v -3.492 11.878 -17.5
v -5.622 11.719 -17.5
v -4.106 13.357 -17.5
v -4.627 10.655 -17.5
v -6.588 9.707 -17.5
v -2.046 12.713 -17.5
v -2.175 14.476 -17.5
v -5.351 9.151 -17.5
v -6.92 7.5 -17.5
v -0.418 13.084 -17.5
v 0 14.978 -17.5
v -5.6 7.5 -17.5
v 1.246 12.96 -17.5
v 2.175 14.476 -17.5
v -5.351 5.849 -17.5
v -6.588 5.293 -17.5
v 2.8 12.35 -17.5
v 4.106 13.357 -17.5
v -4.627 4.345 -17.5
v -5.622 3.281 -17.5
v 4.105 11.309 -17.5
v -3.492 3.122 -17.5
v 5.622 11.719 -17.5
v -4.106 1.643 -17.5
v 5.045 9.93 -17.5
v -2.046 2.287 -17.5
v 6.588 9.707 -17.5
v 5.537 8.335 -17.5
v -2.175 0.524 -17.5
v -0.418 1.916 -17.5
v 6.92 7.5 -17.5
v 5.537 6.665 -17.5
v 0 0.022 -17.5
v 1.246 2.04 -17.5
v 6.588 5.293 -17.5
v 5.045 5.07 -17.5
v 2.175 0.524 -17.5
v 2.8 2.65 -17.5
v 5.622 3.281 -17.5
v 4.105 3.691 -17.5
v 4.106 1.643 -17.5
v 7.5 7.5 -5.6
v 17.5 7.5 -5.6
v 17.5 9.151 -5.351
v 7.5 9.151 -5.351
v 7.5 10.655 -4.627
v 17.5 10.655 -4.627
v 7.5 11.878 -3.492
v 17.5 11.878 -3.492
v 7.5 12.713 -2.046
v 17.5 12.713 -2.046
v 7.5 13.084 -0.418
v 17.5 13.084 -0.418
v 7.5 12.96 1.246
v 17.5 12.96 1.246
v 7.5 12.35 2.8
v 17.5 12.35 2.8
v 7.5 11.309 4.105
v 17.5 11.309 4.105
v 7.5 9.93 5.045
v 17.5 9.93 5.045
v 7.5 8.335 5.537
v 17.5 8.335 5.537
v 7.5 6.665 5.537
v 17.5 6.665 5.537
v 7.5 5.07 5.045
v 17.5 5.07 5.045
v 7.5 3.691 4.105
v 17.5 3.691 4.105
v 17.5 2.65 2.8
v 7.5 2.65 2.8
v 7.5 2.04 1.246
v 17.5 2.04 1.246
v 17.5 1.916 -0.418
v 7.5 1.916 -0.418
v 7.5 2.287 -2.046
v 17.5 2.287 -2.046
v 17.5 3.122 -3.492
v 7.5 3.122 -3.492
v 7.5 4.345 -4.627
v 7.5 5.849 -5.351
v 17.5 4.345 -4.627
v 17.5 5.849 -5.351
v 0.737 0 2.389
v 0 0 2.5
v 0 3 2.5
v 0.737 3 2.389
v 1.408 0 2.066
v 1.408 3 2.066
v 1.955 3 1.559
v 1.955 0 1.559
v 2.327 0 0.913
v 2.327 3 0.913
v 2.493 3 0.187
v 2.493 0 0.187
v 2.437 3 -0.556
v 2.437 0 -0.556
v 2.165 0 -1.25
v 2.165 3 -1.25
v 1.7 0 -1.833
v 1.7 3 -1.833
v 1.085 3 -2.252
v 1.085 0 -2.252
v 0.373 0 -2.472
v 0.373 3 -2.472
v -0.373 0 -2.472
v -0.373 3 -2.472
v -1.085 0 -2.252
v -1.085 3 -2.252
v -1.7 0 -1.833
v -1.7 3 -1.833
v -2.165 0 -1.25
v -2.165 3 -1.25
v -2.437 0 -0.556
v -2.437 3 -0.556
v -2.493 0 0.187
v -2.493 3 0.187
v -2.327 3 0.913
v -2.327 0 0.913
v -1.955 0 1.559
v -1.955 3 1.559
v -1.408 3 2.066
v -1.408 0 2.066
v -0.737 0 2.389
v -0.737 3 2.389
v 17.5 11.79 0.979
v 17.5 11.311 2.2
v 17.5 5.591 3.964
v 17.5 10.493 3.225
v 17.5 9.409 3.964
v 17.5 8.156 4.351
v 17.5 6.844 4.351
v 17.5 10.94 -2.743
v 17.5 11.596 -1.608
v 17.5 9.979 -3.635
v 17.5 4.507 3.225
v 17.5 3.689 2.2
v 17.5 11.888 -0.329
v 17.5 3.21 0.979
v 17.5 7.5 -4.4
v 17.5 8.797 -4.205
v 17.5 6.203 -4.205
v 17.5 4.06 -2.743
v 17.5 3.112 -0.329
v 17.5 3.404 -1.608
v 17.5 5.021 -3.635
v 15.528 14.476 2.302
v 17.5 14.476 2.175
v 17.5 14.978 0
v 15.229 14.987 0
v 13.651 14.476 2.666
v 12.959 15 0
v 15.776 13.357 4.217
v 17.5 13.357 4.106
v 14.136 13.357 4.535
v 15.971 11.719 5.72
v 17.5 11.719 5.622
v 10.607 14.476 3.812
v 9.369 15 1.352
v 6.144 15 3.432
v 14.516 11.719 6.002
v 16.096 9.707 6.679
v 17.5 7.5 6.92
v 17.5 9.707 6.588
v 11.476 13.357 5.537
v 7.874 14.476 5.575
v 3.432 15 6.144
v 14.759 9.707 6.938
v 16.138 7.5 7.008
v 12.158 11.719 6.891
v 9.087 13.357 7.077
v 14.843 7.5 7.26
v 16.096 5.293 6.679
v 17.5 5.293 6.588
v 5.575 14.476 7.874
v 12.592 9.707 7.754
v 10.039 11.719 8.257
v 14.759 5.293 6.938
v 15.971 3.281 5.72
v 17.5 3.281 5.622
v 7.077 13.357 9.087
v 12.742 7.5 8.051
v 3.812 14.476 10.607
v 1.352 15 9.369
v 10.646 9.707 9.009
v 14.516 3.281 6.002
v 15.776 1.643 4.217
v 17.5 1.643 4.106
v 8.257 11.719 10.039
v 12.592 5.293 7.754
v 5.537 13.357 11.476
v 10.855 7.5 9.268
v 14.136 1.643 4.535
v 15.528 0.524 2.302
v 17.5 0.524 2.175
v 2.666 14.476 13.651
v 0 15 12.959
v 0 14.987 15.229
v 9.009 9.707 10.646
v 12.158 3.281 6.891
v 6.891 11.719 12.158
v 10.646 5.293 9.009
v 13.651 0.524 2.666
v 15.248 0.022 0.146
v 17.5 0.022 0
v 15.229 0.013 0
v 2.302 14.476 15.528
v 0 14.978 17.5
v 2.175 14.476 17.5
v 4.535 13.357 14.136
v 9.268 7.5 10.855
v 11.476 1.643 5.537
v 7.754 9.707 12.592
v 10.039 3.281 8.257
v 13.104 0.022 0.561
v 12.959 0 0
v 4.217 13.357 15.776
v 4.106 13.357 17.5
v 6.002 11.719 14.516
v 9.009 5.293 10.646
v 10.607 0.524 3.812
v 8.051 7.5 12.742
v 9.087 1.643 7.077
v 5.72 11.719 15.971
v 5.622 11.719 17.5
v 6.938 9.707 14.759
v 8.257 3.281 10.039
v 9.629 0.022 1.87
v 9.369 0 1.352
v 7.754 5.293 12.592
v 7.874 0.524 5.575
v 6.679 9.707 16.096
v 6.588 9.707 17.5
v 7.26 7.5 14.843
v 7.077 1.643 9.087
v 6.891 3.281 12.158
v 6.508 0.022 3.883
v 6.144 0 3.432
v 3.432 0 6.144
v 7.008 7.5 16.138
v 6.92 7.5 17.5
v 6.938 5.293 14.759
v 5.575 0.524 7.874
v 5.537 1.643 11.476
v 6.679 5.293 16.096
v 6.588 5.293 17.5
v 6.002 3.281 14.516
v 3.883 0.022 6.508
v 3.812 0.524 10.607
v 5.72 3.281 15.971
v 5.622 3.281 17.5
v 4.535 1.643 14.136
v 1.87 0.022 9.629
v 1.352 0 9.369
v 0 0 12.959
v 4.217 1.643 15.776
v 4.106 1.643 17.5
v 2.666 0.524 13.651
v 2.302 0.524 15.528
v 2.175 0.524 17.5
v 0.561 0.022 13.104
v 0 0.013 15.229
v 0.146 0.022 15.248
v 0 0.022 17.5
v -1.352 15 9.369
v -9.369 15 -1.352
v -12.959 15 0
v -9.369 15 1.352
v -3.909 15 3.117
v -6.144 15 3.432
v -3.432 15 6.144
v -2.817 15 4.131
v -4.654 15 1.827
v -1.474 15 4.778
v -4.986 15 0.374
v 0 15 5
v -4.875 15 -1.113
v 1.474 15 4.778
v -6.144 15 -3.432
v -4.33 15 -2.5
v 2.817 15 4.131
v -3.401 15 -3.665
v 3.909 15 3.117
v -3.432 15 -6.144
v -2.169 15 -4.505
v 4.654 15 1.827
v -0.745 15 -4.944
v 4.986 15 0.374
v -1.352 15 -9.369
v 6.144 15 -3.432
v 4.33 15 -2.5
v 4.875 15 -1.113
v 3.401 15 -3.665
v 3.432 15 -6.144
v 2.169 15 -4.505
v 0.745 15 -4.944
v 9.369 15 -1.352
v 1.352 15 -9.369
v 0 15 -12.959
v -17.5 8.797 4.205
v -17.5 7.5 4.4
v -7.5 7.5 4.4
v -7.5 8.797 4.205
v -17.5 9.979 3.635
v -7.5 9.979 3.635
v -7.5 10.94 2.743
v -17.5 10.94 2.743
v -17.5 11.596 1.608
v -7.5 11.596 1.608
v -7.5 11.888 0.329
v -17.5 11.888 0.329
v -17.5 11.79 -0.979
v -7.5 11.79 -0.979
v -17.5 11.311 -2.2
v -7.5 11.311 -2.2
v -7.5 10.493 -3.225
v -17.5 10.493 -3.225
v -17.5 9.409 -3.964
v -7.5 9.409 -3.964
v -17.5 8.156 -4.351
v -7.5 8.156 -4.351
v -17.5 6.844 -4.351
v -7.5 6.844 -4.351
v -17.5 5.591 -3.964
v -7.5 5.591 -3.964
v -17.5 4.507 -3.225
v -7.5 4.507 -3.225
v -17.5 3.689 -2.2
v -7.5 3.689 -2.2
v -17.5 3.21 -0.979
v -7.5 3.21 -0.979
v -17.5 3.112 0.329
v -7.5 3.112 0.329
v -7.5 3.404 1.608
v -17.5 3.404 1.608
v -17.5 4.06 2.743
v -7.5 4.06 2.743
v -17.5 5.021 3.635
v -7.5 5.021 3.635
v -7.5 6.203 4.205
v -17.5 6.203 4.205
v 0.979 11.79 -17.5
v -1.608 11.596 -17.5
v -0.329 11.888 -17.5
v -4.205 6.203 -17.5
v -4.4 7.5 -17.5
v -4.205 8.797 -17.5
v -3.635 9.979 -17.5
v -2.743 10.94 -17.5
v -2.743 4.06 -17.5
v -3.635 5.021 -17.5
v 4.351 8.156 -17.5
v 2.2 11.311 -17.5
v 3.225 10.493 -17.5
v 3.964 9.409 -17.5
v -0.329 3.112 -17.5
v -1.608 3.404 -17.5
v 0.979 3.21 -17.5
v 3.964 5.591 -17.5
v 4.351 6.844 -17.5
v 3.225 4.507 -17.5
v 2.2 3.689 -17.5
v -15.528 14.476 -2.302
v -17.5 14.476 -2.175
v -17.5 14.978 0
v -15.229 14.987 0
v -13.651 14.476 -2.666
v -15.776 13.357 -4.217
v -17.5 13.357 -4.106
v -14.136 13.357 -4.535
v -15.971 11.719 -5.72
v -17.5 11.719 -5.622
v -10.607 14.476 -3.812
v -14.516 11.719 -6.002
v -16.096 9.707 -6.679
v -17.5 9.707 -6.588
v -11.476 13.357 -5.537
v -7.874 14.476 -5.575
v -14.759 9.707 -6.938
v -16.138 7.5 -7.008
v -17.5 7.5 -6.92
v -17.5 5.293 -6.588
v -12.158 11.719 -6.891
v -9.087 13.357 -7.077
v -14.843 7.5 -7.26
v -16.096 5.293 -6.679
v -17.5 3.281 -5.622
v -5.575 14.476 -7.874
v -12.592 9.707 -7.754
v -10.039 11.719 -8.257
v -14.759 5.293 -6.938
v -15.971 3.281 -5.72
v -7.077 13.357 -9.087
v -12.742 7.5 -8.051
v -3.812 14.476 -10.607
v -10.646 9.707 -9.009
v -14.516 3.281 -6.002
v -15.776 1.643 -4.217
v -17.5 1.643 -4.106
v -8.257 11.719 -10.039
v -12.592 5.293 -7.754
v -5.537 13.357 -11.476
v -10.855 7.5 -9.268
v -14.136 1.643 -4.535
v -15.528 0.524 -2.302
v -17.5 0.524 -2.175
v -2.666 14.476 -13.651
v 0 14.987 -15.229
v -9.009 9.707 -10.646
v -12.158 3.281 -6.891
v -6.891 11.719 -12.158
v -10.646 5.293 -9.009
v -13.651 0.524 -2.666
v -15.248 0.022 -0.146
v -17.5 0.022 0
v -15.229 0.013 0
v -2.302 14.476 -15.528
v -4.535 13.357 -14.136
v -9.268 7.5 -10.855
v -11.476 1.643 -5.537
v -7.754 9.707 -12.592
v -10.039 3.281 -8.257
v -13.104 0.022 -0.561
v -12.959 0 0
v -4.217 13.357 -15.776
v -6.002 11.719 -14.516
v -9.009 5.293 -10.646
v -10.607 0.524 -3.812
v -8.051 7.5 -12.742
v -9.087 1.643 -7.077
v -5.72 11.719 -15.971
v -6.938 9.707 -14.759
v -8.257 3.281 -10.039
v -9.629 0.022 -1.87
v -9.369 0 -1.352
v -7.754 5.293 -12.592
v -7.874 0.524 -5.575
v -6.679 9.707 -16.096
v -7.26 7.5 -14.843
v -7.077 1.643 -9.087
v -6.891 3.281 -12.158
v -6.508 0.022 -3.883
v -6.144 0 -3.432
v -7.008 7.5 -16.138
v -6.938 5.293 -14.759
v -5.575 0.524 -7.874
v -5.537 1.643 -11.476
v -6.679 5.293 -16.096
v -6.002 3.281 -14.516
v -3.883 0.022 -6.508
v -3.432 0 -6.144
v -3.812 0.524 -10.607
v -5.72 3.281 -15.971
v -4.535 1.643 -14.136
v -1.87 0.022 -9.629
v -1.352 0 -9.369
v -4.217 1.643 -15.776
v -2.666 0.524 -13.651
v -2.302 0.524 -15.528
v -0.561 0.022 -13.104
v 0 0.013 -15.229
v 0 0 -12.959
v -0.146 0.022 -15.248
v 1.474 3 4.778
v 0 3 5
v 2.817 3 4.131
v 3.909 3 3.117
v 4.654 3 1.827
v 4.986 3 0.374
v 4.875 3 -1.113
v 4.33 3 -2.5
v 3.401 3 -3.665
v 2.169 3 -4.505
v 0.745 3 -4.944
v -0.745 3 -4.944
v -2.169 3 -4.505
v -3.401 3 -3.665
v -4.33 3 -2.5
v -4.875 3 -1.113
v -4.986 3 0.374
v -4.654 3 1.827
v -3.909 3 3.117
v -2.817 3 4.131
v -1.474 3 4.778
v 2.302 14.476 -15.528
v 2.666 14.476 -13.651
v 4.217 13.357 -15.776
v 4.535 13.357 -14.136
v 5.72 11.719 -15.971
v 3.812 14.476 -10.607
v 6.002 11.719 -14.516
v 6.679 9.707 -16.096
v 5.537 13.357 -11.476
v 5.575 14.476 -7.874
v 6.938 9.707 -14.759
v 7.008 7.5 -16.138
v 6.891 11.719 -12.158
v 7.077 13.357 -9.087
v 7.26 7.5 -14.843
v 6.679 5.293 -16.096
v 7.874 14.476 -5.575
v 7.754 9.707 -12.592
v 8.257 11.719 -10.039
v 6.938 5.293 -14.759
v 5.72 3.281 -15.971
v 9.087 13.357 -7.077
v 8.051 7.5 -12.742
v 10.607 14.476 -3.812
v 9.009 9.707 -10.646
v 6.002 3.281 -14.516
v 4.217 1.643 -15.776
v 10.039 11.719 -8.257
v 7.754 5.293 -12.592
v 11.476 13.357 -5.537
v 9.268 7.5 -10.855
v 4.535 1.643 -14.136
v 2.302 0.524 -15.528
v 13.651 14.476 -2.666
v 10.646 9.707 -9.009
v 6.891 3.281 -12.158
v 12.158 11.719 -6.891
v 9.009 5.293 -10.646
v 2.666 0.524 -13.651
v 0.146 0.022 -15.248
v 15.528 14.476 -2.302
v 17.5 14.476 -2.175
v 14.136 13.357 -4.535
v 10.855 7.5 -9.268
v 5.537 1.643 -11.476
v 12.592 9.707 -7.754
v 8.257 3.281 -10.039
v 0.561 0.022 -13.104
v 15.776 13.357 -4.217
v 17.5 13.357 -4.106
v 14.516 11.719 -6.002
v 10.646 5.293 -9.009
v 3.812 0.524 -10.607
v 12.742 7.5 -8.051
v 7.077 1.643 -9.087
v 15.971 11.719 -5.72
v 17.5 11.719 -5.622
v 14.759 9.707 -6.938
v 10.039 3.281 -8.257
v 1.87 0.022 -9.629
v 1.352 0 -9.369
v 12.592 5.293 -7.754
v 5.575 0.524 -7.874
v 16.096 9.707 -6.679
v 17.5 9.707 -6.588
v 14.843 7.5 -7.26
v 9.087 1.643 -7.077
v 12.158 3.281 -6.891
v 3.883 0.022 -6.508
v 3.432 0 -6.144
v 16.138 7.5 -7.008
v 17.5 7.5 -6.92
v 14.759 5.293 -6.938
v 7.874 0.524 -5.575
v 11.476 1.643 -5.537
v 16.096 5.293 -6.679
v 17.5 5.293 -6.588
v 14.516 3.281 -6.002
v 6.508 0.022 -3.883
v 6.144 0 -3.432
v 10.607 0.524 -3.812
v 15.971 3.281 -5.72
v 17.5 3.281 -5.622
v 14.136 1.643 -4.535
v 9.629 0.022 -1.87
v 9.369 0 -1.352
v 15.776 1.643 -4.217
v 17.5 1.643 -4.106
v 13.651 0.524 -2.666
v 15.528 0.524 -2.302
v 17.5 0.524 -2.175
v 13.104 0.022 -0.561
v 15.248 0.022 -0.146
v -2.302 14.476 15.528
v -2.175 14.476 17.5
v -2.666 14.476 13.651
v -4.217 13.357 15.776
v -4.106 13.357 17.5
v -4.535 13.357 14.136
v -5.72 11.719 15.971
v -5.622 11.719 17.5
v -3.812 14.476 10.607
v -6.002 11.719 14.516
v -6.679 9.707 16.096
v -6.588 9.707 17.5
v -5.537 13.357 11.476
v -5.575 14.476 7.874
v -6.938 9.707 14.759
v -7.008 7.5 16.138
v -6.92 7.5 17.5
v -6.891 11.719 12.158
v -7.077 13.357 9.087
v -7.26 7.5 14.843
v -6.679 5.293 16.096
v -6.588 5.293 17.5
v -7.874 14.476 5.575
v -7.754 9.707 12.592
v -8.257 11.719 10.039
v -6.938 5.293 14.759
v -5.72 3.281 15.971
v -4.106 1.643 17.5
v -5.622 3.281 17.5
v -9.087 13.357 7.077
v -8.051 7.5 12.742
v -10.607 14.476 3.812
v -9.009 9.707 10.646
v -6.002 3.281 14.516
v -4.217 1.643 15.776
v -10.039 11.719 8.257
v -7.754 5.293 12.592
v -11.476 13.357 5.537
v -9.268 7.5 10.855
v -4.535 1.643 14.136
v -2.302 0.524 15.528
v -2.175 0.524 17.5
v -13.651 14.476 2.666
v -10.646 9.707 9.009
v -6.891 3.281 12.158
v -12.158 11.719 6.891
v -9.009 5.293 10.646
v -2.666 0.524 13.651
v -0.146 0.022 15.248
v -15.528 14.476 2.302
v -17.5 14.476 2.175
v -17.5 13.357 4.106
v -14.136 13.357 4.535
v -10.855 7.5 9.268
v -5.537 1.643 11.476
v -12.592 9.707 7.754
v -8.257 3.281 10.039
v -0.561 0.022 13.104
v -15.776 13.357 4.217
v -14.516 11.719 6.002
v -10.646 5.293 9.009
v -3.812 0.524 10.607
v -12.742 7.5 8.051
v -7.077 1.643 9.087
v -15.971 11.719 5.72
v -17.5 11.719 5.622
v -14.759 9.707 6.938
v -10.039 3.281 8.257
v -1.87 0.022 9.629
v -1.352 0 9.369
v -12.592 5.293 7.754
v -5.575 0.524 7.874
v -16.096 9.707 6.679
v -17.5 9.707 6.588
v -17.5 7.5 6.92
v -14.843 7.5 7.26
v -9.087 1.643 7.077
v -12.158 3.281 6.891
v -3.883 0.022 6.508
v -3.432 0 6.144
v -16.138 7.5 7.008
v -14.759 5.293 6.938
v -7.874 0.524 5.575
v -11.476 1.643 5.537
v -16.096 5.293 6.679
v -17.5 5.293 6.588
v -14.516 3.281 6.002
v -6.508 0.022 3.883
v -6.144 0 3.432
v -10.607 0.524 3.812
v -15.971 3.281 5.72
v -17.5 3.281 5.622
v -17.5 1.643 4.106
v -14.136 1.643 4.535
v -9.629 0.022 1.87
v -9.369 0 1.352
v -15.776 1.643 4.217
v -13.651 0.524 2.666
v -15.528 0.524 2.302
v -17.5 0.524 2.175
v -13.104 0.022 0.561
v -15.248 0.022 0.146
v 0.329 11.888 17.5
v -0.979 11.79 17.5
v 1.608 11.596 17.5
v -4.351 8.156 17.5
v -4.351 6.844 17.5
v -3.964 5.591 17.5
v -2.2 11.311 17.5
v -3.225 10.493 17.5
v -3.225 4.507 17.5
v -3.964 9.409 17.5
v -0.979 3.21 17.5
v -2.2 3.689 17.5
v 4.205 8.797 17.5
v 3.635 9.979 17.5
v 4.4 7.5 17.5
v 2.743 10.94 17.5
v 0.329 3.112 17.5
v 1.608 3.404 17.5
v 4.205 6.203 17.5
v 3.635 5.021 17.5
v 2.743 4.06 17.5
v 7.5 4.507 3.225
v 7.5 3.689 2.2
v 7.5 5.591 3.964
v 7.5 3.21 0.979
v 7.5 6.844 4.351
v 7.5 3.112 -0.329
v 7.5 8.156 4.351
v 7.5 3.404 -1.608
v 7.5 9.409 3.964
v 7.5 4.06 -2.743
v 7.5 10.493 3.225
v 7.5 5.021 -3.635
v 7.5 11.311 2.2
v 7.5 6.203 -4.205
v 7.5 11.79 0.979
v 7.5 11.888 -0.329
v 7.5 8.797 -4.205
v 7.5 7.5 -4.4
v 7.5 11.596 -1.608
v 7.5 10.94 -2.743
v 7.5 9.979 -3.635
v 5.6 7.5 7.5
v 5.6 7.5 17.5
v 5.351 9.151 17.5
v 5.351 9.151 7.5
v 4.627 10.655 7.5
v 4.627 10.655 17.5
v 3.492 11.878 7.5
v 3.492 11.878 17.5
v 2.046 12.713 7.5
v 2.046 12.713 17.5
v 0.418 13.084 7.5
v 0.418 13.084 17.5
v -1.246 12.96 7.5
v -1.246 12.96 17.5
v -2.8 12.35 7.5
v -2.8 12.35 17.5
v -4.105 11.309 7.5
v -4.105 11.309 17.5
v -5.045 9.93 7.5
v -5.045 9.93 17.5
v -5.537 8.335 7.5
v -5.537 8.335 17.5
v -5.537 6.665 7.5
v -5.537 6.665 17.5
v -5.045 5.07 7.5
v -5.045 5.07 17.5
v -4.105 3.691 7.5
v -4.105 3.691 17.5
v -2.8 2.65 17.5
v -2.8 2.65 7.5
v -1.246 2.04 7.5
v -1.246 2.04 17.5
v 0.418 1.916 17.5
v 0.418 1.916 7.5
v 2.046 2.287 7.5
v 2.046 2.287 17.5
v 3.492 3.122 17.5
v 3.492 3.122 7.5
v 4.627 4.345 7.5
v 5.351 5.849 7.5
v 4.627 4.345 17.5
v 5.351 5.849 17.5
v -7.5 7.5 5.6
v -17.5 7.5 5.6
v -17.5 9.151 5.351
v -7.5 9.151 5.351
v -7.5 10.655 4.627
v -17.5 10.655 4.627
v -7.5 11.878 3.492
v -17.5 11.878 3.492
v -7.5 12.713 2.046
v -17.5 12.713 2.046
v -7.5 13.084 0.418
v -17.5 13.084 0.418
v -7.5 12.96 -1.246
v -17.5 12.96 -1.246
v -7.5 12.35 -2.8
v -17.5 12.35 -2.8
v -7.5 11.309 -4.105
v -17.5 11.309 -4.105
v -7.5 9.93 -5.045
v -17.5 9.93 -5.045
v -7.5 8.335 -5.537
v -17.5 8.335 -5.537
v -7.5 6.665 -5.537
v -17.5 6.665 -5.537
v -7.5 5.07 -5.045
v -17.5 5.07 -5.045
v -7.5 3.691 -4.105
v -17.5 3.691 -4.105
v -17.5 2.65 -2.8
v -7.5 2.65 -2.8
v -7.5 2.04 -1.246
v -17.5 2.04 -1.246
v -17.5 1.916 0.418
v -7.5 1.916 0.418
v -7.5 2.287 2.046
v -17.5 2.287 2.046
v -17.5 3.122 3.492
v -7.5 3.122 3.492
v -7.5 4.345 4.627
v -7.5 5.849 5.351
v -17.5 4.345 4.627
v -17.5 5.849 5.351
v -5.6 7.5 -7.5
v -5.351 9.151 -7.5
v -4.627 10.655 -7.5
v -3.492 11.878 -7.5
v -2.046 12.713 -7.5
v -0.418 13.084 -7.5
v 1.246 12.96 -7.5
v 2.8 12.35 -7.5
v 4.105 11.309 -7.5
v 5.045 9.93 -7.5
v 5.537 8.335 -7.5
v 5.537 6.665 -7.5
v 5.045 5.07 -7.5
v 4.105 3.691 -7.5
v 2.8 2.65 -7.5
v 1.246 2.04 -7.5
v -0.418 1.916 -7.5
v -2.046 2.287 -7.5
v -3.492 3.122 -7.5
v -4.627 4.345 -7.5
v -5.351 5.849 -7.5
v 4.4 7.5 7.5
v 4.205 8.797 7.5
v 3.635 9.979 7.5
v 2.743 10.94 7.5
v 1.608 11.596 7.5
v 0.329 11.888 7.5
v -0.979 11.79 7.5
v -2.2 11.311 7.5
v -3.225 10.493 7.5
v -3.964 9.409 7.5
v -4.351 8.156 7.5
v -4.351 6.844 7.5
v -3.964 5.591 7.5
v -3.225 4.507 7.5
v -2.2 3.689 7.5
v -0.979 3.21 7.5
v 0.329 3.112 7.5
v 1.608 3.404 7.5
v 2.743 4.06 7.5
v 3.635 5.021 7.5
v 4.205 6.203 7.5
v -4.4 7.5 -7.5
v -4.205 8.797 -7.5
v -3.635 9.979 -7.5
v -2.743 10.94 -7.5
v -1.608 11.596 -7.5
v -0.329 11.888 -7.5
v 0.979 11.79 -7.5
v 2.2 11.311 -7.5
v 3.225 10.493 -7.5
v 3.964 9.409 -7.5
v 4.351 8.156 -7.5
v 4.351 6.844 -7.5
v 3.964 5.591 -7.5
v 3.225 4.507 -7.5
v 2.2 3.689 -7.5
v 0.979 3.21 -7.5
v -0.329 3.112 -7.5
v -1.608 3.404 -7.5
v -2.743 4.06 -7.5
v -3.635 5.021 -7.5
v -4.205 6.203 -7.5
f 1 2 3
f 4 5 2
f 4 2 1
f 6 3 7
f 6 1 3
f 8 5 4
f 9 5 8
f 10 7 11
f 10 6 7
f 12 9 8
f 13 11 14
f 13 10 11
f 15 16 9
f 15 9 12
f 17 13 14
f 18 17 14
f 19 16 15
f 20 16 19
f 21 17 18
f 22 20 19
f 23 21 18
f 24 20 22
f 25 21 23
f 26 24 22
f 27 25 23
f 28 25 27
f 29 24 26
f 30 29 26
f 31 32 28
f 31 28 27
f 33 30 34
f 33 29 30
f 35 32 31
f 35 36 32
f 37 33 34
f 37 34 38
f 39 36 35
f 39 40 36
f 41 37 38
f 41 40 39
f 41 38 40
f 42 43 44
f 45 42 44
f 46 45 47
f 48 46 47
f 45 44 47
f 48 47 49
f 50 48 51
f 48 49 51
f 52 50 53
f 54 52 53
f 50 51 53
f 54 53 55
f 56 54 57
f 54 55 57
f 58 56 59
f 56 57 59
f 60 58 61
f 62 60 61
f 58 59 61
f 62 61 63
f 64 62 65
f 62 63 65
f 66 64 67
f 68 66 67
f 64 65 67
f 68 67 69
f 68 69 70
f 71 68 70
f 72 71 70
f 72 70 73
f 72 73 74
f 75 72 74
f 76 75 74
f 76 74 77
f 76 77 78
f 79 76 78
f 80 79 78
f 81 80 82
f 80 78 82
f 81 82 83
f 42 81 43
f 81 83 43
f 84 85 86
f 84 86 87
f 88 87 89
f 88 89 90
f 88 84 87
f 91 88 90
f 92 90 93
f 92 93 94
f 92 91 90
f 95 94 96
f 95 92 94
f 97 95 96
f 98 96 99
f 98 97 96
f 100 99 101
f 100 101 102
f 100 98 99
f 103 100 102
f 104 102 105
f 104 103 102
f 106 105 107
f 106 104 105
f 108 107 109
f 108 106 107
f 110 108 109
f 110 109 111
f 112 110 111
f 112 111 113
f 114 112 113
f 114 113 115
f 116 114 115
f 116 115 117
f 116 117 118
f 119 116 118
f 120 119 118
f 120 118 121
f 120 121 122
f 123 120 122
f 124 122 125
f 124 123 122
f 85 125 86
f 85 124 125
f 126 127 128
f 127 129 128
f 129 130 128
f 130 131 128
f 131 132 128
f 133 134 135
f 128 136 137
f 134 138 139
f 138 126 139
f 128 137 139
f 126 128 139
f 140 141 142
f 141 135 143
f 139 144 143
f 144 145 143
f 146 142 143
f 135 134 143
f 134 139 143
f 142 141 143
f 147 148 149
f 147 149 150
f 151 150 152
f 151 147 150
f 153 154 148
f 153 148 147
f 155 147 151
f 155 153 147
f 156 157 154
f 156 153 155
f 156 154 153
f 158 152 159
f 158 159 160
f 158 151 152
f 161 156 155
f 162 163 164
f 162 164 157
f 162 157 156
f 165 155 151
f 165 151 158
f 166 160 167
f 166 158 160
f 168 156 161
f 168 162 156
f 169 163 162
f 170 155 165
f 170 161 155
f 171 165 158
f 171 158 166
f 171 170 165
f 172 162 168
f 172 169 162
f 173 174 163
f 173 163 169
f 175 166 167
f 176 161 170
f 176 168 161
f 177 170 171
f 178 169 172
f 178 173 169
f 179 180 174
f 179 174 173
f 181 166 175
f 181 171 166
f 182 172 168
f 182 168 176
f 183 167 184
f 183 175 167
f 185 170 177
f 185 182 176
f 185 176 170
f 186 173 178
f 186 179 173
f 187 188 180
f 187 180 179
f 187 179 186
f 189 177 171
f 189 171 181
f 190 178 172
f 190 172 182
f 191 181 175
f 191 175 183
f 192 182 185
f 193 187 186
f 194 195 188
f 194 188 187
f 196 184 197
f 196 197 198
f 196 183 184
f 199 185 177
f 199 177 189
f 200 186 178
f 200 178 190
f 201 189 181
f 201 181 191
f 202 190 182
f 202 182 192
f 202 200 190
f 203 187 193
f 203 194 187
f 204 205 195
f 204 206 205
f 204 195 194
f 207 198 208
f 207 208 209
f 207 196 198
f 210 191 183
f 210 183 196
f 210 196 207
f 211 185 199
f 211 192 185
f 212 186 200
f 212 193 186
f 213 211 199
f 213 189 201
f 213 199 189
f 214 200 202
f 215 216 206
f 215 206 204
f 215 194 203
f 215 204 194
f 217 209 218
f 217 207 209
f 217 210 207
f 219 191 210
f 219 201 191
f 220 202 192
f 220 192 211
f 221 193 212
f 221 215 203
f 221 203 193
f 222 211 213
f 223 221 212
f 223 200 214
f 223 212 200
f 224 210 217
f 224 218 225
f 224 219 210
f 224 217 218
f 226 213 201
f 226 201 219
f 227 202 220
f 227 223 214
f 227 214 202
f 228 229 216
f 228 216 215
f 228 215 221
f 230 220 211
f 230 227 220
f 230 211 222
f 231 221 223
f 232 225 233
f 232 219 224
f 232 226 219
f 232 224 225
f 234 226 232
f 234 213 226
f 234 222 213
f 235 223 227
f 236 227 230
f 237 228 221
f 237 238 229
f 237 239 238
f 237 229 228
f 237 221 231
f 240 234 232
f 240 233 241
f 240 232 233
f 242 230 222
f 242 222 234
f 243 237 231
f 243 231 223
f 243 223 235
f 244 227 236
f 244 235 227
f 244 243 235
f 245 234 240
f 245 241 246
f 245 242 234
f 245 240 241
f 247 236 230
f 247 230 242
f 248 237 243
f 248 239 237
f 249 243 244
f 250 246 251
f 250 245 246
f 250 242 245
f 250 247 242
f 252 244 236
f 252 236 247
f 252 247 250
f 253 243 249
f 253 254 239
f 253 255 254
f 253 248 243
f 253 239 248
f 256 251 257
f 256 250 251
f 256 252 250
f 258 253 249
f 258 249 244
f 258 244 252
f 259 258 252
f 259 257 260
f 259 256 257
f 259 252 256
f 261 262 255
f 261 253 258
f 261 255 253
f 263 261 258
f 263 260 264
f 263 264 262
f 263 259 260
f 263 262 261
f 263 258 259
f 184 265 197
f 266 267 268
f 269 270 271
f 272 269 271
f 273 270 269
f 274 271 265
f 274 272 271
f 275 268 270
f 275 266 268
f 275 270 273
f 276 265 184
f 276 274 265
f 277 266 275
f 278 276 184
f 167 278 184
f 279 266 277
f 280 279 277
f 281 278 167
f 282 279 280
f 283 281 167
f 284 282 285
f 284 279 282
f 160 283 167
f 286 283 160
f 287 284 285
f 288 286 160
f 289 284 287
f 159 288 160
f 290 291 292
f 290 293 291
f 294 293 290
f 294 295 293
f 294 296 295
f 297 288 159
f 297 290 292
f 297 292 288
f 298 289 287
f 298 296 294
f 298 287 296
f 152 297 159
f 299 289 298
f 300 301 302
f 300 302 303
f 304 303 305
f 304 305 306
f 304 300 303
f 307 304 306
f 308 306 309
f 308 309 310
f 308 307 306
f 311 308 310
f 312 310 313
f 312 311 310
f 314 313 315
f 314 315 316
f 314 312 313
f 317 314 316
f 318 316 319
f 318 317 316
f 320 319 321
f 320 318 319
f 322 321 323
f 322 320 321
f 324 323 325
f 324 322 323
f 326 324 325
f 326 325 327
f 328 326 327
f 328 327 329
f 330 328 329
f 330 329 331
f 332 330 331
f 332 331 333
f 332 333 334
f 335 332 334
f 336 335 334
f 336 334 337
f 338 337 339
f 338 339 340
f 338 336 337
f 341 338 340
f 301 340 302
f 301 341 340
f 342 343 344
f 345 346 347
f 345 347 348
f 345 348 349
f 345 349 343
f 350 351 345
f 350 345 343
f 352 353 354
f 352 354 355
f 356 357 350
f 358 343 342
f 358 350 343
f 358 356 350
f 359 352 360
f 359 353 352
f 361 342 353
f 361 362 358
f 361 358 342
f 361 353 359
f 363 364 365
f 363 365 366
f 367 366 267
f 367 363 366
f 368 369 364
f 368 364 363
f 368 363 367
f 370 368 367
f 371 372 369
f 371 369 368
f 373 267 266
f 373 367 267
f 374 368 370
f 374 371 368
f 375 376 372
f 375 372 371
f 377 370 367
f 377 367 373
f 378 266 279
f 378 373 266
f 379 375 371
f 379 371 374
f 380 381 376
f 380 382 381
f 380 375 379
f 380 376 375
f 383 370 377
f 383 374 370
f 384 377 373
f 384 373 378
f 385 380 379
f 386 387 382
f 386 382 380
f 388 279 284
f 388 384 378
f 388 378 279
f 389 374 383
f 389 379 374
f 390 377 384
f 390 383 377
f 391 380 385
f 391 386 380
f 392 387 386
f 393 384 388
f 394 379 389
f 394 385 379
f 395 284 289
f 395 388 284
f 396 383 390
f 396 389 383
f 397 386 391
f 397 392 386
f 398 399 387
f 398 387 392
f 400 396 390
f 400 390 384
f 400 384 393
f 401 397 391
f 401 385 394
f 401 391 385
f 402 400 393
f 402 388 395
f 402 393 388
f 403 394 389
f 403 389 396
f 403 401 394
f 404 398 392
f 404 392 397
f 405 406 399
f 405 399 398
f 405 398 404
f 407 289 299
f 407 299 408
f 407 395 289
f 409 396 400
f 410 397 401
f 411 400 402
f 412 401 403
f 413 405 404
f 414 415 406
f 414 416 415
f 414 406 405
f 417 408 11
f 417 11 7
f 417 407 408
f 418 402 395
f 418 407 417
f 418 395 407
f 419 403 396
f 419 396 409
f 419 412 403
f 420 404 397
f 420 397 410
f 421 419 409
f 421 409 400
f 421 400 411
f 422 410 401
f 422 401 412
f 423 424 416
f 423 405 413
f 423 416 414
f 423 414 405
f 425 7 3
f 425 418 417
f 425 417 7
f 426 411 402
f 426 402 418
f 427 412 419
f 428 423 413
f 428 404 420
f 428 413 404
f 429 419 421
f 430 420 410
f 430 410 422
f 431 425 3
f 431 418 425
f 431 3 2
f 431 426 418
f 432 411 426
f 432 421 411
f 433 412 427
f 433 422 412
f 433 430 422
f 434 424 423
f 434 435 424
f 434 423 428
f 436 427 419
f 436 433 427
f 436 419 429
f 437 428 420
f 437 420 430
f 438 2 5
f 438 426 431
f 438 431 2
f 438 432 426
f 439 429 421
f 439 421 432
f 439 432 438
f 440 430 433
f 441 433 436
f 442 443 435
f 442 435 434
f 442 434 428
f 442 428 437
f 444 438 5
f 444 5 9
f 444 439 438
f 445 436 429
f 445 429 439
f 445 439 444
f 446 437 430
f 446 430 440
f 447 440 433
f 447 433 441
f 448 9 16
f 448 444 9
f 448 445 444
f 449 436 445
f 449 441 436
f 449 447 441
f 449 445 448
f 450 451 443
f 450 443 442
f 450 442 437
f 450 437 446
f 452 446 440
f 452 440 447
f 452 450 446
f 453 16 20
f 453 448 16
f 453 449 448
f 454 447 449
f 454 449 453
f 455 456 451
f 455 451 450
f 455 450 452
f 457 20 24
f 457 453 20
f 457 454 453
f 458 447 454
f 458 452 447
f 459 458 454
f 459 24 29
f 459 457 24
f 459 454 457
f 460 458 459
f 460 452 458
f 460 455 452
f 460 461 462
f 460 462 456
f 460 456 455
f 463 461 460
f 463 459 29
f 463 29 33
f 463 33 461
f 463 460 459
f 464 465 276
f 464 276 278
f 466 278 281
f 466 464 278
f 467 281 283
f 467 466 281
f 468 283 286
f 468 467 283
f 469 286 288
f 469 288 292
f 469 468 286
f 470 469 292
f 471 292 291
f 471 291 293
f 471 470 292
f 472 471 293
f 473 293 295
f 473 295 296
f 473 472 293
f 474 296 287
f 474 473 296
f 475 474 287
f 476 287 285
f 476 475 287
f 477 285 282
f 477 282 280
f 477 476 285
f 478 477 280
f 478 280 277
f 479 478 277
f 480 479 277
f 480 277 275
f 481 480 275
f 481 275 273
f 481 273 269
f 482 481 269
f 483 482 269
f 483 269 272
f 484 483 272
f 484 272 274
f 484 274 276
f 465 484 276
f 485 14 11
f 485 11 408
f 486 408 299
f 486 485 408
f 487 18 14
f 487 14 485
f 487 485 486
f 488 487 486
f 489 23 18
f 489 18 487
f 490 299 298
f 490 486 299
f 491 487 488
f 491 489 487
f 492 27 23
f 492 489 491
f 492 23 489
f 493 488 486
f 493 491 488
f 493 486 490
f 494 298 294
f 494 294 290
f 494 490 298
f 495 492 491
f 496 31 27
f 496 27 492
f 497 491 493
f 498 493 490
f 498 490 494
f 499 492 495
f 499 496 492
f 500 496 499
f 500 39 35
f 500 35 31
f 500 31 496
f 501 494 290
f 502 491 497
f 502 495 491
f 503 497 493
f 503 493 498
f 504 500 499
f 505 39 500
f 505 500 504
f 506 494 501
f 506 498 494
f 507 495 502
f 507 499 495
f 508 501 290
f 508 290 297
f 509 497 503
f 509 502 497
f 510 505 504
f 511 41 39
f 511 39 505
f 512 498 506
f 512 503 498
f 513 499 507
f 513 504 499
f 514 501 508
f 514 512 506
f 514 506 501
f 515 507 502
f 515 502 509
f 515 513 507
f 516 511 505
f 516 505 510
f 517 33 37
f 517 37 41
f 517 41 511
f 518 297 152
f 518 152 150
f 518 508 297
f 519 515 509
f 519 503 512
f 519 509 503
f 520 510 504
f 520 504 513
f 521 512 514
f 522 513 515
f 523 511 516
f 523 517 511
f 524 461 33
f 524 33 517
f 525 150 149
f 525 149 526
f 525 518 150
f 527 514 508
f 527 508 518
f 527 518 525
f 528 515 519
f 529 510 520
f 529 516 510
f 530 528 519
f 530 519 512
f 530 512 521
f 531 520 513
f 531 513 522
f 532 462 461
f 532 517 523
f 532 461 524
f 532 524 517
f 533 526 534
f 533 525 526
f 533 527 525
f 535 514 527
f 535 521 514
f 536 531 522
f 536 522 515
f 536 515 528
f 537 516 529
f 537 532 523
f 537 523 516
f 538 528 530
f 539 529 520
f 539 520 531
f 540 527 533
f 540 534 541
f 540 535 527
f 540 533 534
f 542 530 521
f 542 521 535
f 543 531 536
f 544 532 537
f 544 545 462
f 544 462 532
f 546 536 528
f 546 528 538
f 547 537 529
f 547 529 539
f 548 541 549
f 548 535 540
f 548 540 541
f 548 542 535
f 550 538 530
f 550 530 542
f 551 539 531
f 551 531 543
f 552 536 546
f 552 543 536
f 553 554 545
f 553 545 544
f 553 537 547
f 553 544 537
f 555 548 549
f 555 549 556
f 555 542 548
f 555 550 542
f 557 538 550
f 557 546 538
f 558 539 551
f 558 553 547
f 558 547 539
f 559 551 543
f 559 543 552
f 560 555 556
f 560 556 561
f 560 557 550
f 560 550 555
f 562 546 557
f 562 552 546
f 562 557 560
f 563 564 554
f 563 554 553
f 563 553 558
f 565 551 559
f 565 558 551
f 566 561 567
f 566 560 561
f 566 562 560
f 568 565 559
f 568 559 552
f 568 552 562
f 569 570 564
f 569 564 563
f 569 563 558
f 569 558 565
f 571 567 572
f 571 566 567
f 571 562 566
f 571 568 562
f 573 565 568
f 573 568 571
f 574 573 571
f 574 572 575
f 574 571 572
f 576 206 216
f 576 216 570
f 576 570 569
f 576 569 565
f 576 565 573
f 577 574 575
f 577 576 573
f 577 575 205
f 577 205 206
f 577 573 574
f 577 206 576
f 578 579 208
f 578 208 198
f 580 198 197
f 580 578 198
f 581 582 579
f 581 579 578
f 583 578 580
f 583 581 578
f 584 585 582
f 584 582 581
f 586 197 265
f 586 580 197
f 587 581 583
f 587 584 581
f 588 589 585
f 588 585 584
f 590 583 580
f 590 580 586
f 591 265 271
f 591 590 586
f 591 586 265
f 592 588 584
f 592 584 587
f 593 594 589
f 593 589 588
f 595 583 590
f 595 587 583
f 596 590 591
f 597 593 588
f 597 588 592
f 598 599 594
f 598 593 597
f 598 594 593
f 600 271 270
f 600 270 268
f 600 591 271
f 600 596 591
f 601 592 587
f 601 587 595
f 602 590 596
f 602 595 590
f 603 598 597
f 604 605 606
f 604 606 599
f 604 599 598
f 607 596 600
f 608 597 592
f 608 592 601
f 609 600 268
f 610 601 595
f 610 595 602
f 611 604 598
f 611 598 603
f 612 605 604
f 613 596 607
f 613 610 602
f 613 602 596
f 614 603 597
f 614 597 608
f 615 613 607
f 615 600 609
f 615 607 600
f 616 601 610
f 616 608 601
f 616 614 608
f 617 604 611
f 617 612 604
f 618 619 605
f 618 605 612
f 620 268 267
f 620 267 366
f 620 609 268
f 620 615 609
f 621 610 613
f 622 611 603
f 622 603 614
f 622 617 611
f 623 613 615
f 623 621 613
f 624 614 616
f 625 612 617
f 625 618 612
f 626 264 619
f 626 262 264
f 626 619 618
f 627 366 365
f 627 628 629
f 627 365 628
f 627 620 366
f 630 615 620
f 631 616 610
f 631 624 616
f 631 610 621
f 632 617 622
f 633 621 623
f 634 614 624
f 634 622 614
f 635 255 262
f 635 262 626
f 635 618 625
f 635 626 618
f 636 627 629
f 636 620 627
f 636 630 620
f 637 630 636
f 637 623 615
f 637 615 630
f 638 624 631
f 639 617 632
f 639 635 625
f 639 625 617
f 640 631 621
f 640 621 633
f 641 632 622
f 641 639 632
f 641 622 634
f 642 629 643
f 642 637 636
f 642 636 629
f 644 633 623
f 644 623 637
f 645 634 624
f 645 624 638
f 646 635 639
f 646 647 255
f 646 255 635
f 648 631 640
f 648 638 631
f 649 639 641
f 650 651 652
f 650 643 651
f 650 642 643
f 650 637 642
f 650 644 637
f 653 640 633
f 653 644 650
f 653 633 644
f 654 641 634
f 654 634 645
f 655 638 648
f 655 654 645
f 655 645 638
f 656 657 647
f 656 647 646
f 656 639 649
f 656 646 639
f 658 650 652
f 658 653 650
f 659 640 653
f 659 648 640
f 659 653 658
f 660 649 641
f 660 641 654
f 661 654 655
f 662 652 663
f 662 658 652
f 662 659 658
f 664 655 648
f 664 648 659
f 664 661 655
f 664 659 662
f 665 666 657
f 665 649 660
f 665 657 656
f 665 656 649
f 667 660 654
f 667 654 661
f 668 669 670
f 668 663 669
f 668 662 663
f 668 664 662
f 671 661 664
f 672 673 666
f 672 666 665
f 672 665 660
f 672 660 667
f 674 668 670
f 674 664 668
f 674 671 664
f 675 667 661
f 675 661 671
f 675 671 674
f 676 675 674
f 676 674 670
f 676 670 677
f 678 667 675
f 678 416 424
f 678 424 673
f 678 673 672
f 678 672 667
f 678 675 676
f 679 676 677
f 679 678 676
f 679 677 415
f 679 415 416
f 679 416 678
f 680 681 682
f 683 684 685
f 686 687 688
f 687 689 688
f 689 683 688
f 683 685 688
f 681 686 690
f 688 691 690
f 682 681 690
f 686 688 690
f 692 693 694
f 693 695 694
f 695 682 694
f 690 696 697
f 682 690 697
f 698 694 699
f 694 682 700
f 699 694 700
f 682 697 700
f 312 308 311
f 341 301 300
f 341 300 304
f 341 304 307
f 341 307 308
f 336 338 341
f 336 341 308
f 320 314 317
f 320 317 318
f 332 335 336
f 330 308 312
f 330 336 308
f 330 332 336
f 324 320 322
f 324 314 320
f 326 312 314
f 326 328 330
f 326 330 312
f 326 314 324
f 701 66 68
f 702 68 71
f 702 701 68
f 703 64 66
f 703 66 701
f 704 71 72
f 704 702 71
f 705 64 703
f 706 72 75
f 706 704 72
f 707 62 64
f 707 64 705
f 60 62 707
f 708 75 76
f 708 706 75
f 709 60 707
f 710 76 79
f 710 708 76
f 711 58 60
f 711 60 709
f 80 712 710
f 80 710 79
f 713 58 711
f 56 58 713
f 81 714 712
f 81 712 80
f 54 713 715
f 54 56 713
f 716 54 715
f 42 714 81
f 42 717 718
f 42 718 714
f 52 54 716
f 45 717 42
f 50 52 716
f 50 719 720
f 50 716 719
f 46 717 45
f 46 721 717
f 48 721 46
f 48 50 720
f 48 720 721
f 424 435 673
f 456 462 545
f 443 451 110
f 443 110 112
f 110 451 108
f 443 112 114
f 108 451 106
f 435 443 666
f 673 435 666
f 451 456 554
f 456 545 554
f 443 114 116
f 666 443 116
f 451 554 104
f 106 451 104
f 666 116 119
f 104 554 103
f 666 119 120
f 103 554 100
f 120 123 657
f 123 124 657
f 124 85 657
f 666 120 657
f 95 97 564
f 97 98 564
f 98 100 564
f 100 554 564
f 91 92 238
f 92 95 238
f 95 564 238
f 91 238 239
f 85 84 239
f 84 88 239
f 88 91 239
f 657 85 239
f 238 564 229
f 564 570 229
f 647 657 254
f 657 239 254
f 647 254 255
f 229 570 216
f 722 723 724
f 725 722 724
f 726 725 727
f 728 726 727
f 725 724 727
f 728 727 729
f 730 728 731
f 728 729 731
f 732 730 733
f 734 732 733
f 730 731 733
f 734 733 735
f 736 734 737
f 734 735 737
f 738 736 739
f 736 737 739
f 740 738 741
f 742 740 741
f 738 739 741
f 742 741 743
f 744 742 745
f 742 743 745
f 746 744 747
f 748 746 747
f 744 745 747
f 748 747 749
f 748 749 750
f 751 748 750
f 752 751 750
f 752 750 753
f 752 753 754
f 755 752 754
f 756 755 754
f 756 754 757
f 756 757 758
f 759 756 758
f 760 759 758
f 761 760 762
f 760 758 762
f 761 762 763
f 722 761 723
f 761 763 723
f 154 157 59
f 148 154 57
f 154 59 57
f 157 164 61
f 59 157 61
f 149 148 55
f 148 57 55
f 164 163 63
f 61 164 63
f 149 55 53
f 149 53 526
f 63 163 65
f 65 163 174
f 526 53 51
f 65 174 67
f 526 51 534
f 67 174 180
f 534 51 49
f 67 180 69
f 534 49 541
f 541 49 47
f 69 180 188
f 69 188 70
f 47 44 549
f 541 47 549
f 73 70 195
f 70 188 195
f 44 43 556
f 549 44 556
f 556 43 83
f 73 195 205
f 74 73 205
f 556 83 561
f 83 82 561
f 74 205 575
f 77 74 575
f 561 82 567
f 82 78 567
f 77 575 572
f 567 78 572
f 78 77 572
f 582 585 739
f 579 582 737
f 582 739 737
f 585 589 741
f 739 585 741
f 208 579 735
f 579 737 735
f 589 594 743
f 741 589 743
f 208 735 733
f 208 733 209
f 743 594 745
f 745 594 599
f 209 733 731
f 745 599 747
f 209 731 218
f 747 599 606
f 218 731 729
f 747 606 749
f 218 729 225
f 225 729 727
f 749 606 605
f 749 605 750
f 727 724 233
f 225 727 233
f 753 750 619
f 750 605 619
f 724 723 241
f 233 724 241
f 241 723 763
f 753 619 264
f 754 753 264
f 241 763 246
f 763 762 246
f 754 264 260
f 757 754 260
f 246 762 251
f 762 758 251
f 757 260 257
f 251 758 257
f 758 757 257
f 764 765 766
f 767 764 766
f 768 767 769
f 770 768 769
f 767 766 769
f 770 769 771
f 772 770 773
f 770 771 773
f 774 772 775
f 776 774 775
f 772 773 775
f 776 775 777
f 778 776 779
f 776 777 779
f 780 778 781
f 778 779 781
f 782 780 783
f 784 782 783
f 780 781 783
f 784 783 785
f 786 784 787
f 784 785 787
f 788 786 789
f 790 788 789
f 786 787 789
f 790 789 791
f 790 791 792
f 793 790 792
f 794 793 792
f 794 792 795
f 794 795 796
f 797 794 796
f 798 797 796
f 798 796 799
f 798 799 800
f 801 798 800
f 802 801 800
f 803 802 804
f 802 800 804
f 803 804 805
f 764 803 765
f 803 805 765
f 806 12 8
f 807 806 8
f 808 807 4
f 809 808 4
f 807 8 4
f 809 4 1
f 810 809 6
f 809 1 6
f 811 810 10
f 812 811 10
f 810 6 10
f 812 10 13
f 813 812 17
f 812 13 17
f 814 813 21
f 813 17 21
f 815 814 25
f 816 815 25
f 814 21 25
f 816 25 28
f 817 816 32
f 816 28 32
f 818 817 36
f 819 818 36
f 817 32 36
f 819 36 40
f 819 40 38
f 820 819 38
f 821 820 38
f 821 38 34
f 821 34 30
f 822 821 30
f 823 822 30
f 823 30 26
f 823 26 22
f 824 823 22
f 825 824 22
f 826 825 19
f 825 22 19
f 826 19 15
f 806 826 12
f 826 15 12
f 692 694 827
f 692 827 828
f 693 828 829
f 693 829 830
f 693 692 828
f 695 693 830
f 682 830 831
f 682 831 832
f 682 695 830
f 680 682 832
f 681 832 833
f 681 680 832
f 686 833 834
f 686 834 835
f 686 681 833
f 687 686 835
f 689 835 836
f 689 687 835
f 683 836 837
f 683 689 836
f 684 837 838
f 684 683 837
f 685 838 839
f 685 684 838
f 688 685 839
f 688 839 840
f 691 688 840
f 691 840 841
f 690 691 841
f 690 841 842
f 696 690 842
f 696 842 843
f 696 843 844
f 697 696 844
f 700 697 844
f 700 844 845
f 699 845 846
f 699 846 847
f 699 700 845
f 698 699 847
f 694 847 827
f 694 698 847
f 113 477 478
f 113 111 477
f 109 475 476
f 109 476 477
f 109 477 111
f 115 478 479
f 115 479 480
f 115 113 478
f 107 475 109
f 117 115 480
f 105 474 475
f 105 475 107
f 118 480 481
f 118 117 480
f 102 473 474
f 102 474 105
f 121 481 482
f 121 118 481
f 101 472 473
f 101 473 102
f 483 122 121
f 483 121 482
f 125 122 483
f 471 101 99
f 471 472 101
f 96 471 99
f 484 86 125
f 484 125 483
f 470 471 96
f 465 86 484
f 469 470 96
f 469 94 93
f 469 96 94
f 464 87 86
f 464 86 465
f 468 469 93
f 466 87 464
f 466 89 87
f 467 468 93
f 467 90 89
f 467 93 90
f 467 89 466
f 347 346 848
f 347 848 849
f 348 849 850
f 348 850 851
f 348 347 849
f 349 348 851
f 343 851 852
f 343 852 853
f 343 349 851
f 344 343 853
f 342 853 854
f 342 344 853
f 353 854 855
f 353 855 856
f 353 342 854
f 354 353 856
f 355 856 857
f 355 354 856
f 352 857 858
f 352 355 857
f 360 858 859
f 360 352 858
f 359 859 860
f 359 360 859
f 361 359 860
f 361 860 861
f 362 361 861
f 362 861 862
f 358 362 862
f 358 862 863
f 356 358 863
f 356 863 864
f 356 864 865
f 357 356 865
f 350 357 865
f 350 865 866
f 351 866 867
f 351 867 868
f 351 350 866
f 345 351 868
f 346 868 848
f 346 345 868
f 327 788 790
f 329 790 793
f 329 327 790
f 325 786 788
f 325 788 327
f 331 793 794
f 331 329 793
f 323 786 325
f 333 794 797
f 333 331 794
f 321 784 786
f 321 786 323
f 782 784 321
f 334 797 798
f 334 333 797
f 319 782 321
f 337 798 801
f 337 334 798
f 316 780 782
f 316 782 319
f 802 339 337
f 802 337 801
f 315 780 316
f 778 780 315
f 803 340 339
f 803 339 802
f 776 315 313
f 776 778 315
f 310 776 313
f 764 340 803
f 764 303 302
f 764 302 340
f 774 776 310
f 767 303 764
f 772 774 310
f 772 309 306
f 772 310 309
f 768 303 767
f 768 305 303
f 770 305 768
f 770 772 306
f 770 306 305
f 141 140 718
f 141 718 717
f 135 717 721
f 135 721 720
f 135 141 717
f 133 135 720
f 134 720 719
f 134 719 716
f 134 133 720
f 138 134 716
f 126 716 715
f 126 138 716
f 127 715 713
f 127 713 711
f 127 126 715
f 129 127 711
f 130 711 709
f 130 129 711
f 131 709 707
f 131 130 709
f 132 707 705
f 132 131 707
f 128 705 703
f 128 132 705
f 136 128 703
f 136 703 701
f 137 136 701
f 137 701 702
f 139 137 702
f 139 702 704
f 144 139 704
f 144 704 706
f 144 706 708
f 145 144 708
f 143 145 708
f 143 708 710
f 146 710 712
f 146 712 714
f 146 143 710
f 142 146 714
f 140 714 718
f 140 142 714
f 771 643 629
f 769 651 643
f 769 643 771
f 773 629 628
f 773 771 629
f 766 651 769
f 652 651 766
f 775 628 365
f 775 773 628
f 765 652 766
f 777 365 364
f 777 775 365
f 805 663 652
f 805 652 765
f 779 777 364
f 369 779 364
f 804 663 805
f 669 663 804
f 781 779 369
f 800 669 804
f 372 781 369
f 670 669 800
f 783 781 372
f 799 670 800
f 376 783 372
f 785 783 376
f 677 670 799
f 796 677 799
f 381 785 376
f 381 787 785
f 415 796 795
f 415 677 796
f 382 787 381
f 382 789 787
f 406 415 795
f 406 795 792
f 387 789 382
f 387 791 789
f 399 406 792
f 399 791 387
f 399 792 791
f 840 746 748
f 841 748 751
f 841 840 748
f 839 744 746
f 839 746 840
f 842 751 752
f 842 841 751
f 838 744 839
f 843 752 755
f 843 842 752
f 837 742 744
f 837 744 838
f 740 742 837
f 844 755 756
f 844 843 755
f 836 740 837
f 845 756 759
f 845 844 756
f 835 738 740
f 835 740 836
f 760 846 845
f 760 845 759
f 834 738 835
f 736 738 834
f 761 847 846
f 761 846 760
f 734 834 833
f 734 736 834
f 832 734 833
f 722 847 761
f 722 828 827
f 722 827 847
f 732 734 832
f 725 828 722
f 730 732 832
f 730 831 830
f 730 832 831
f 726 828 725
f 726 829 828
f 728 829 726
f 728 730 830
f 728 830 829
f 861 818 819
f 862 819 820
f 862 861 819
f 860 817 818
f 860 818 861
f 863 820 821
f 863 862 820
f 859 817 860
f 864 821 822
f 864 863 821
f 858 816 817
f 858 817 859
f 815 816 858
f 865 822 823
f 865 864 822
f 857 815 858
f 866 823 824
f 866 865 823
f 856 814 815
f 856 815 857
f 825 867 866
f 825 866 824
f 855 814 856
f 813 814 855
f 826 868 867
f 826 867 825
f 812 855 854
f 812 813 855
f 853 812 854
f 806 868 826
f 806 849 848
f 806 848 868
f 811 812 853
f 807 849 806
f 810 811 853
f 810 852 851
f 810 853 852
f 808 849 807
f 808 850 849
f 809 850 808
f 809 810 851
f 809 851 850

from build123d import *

# Parameters (mm, degrees)
SKETCH3_W                   = 35
SKETCH3_H                   = 35
SKETCH3_R                   = 5
Y_KSEKLIK_EKSTR_ZYON1_DEPTH = 15
IZIM1_R                     = 5.6
IZIM1_R_2                   = 4.4
KES_EKSTR_ZYON2_DEPTH       = 10
DAIRESEL_KAPLAMA1_COUNT     = 4
KES_EKSTR_ZYON3_DEPTH       = 29.939592257
DAIRESEL_KAPLAMA3_COUNT     = 4
RADYUS3_R                   = 7.5
IZIM4_R                     = 5
IZIM4_R_2                   = 2.5
Y_KSEKLIK_EKSTR_ZYON2_DEPTH = 3


with BuildPart() as part:
    # Sketch3 → Yükseklik-Ekstrüzyon1 (new body)
    with BuildSketch(Plane(origin=(0, 0, 0), x_dir=(1, 0, 0), z_dir=(0, 1, 0))):
        Rectangle(SKETCH3_W, SKETCH3_H)
        with Locations(Location((0, 0, 0), (0, 0, 270))):
            Circle(SKETCH3_R, mode=Mode.SUBTRACT)
    extrude(amount=Y_KSEKLIK_EKSTR_ZYON1_DEPTH)

    # Çizim1 → Kes-Ekstrüzyon2 (cut)
    with BuildSketch(Plane.XY.offset(17.5)):
        with Locations((0, 7.5)):
            Circle(IZIM1_R)
        with Locations((0, 7.5)):
            Circle(IZIM1_R_2, mode=Mode.SUBTRACT)
    kes_ekstr_zyon2 = extrude(amount=-KES_EKSTR_ZYON2_DEPTH, mode=Mode.SUBTRACT)

    # Dairesel Kaplama1: Kes-Ekstrüzyon2 ×4 about axis
    dairesel_kaplama1_axis = Axis((0, 0, 0), (0, 1, 0))
    for i in range(1, DAIRESEL_KAPLAMA1_COUNT):
        add(kes_ekstr_zyon2.rotate(dairesel_kaplama1_axis, i * 360 / DAIRESEL_KAPLAMA1_COUNT), mode=Mode.SUBTRACT)

    # Çizim3 → Kes-Ekstrüzyon3 (cut, through all)
    with BuildSketch(Plane(origin=(0, 15, 0), x_dir=(1, 0, 0), z_dir=(0, 1, 0))):
        with BuildLine():
            ThreePointArc((-6.920403545, -17.5), (-10.019095604, -10.019095604), (-17.5, -6.920403545))
            Line((-17.5, -6.920403545), (-17.5, -17.5))
            Line((-17.5, -17.5), (-6.920403545, -17.5))
        make_face()
    kes_ekstr_zyon3 = extrude(amount=-KES_EKSTR_ZYON3_DEPTH, mode=Mode.SUBTRACT)

    # Dairesel Kaplama3: Kes-Ekstrüzyon3 ×4 about axis
    dairesel_kaplama3_axis = Axis((0, 0, 0), (0, 1, 0))
    for i in range(1, DAIRESEL_KAPLAMA3_COUNT):
        add(kes_ekstr_zyon3.rotate(dairesel_kaplama3_axis, i * 360 / DAIRESEL_KAPLAMA3_COUNT), mode=Mode.SUBTRACT)

    # Radyus3
    # the kernel refuses this fillet: 7.5 mm, written as the material it takes off along each edge
    with BuildSketch(Plane(origin=(-17.5, 15, 17.5), x_dir=(1, 0, 0), z_dir=(0, 0, 1))) as radyus3_piece_1:
        with BuildLine():
            CenterArc((10.579596455 + RADYUS3_R, -RADYUS3_R), RADYUS3_R, 90, 90)
            Line((10.579596455, -RADYUS3_R), (10.579596455 - RADYUS3_R * 0.02, -RADYUS3_R))
            Line((10.579596455 - RADYUS3_R * 0.02, -RADYUS3_R), (10.579596455 - RADYUS3_R * 0.02, RADYUS3_R * 0.02))
            Line((10.579596455 - RADYUS3_R * 0.02, RADYUS3_R * 0.02), (10.579596455 + RADYUS3_R, RADYUS3_R * 0.02))
            Line((10.579596455 + RADYUS3_R, RADYUS3_R * 0.02), (10.579596455 + RADYUS3_R, 0))
        make_face()
    radyus3_piece_1_solid = revolve(axis=Axis((-17.5, 15, 17.5), (0, 1, 0)), revolution_arc=90, mode=Mode.PRIVATE)
    with BuildSketch(Plane(origin=(-17.5, 0, 17.5), x_dir=(1, 0, 0), z_dir=(0, 0, 1))) as radyus3_piece_2:
        with BuildLine():
            CenterArc((10.579596455 + RADYUS3_R, RADYUS3_R), RADYUS3_R, 180, 90)
            Line((10.579596455, RADYUS3_R), (10.579596455 - RADYUS3_R * 0.02, RADYUS3_R))
            Line((10.579596455 - RADYUS3_R * 0.02, RADYUS3_R), (10.579596455 - RADYUS3_R * 0.02, -RADYUS3_R * 0.02))
            Line((10.579596455 - RADYUS3_R * 0.02, -RADYUS3_R * 0.02), (10.579596455 + RADYUS3_R, -RADYUS3_R * 0.02))
            Line((10.579596455 + RADYUS3_R, -RADYUS3_R * 0.02), (10.579596455 + RADYUS3_R, 0))
        make_face()
    radyus3_piece_2_solid = revolve(axis=Axis((-17.5, 0, 17.5), (0, 1, 0)), revolution_arc=90, mode=Mode.PRIVATE)
    with BuildSketch(Plane(origin=(-17.5, 15, -17.5), x_dir=(0, 0, 1), z_dir=(-1, 0, 0))) as radyus3_piece_3:
        with BuildLine():
            CenterArc((10.579596455 + RADYUS3_R, -RADYUS3_R), RADYUS3_R, 90, 90)
            Line((10.579596455, -RADYUS3_R), (10.579596455 - RADYUS3_R * 0.02, -RADYUS3_R))
            Line((10.579596455 - RADYUS3_R * 0.02, -RADYUS3_R), (10.579596455 - RADYUS3_R * 0.02, RADYUS3_R * 0.02))
            Line((10.579596455 - RADYUS3_R * 0.02, RADYUS3_R * 0.02), (10.579596455 + RADYUS3_R, RADYUS3_R * 0.02))
            Line((10.579596455 + RADYUS3_R, RADYUS3_R * 0.02), (10.579596455 + RADYUS3_R, 0))
        make_face()
    radyus3_piece_3_solid = revolve(axis=Axis((-17.5, 15, -17.5), (0, 1, 0)), revolution_arc=90, mode=Mode.PRIVATE)
    with BuildSketch(Plane(origin=(17.5, 15, -17.5), x_dir=(-1, 0, 0), z_dir=(0, 0, -1))) as radyus3_piece_4:
        with BuildLine():
            CenterArc((10.579596455 + RADYUS3_R, -RADYUS3_R), RADYUS3_R, 90, 90)
            Line((10.579596455 + RADYUS3_R, 0), (10.579596455 + RADYUS3_R, RADYUS3_R * 0.02))
            Line((10.579596455 + RADYUS3_R, RADYUS3_R * 0.02), (10.579596455 - RADYUS3_R * 0.02, RADYUS3_R * 0.02))
            Line((10.579596455 - RADYUS3_R * 0.02, RADYUS3_R * 0.02), (10.579596455 - RADYUS3_R * 0.02, -RADYUS3_R))
            Line((10.579596455 - RADYUS3_R * 0.02, -RADYUS3_R), (10.579596455, -RADYUS3_R))
        make_face()
    radyus3_piece_4_solid = revolve(axis=Axis((17.5, 15, -17.5), (0, 1, 0)), revolution_arc=90, mode=Mode.PRIVATE)
    with BuildSketch(Plane(origin=(17.5, 15, 17.5), x_dir=(0, 0, -1), z_dir=(1, 0, 0))) as radyus3_piece_5:
        with BuildLine():
            CenterArc((10.579596455 + RADYUS3_R, -RADYUS3_R), RADYUS3_R, 90, 90)
            Line((10.579596455, -RADYUS3_R), (10.579596455 - RADYUS3_R * 0.02, -RADYUS3_R))
            Line((10.579596455 - RADYUS3_R * 0.02, -RADYUS3_R), (10.579596455 - RADYUS3_R * 0.02, RADYUS3_R * 0.02))
            Line((10.579596455 - RADYUS3_R * 0.02, RADYUS3_R * 0.02), (10.579596455 + RADYUS3_R, RADYUS3_R * 0.02))
            Line((10.579596455 + RADYUS3_R, RADYUS3_R * 0.02), (10.579596455 + RADYUS3_R, 0))
        make_face()
    radyus3_piece_5_solid = revolve(axis=Axis((17.5, 15, 17.5), (0, 1, 0)), revolution_arc=90, mode=Mode.PRIVATE)
    with BuildSketch(Plane(origin=(17.5, 0, 17.5), x_dir=(0, 0, -1), z_dir=(1, 0, 0))) as radyus3_piece_6:
        with BuildLine():
            CenterArc((10.579596455 + RADYUS3_R, RADYUS3_R), RADYUS3_R, 180, 90)
            Line((10.579596455, RADYUS3_R), (10.579596455 - RADYUS3_R * 0.02, RADYUS3_R))
            Line((10.579596455 - RADYUS3_R * 0.02, RADYUS3_R), (10.579596455 - RADYUS3_R * 0.02, -RADYUS3_R * 0.02))
            Line((10.579596455 - RADYUS3_R * 0.02, -RADYUS3_R * 0.02), (10.579596455 + RADYUS3_R, -RADYUS3_R * 0.02))
            Line((10.579596455 + RADYUS3_R, -RADYUS3_R * 0.02), (10.579596455 + RADYUS3_R, 0))
        make_face()
    radyus3_piece_6_solid = revolve(axis=Axis((17.5, 0, 17.5), (0, 1, 0)), revolution_arc=90, mode=Mode.PRIVATE)
    with BuildSketch(Plane(origin=(17.5, 0, -17.5), x_dir=(-1, 0, 0), z_dir=(0, 0, -1))) as radyus3_piece_7:
        with BuildLine():
            CenterArc((10.579596455 + RADYUS3_R, RADYUS3_R), RADYUS3_R, 180, 90)
            Line((10.579596455, RADYUS3_R), (10.579596455 - RADYUS3_R * 0.02, RADYUS3_R))
            Line((10.579596455 - RADYUS3_R * 0.02, RADYUS3_R), (10.579596455 - RADYUS3_R * 0.02, -RADYUS3_R * 0.02))
            Line((10.579596455 - RADYUS3_R * 0.02, -RADYUS3_R * 0.02), (10.579596455 + RADYUS3_R, -RADYUS3_R * 0.02))
            Line((10.579596455 + RADYUS3_R, -RADYUS3_R * 0.02), (10.579596455 + RADYUS3_R, 0))
        make_face()
    radyus3_piece_7_solid = revolve(axis=Axis((17.5, 0, -17.5), (0, 1, 0)), revolution_arc=90, mode=Mode.PRIVATE)
    with BuildSketch(Plane(origin=(-17.5, 0, -17.5), x_dir=(0, 0, 1), z_dir=(-1, 0, 0))) as radyus3_piece_8:
        with BuildLine():
            CenterArc((10.579596455 + RADYUS3_R, RADYUS3_R), RADYUS3_R, 180, 90)
            Line((10.579596455, RADYUS3_R), (10.579596455 - RADYUS3_R * 0.02, RADYUS3_R))
            Line((10.579596455 - RADYUS3_R * 0.02, RADYUS3_R), (10.579596455 - RADYUS3_R * 0.02, -RADYUS3_R * 0.02))
            Line((10.579596455 - RADYUS3_R * 0.02, -RADYUS3_R * 0.02), (10.579596455 + RADYUS3_R, -RADYUS3_R * 0.02))
            Line((10.579596455 + RADYUS3_R, -RADYUS3_R * 0.02), (10.579596455 + RADYUS3_R, 0))
        make_face()
    radyus3_piece_8_solid = revolve(axis=Axis((-17.5, 0, -17.5), (0, 1, 0)), revolution_arc=90, mode=Mode.PRIVATE)
    add([radyus3_piece_1_solid, radyus3_piece_2_solid, radyus3_piece_3_solid, radyus3_piece_4_solid, radyus3_piece_5_solid, radyus3_piece_6_solid, radyus3_piece_7_solid, radyus3_piece_8_solid], mode=Mode.SUBTRACT)

    # Çizim4 → Yükseklik-Ekstrüzyon2 (add)
    with BuildSketch(Plane(origin=(0, 0, 0), x_dir=(1, 0, 0), z_dir=(0, 1, 0))):
        with Locations(Location((0, 0, 0), (0, 0, 270))):
            Circle(IZIM4_R)
        with Locations(Location((0, 0, 0), (0, 0, 270))):
            Circle(IZIM4_R_2, mode=Mode.SUBTRACT)
    extrude(amount=Y_KSEKLIK_EKSTR_ZYON2_DEPTH)


solid = part.part
